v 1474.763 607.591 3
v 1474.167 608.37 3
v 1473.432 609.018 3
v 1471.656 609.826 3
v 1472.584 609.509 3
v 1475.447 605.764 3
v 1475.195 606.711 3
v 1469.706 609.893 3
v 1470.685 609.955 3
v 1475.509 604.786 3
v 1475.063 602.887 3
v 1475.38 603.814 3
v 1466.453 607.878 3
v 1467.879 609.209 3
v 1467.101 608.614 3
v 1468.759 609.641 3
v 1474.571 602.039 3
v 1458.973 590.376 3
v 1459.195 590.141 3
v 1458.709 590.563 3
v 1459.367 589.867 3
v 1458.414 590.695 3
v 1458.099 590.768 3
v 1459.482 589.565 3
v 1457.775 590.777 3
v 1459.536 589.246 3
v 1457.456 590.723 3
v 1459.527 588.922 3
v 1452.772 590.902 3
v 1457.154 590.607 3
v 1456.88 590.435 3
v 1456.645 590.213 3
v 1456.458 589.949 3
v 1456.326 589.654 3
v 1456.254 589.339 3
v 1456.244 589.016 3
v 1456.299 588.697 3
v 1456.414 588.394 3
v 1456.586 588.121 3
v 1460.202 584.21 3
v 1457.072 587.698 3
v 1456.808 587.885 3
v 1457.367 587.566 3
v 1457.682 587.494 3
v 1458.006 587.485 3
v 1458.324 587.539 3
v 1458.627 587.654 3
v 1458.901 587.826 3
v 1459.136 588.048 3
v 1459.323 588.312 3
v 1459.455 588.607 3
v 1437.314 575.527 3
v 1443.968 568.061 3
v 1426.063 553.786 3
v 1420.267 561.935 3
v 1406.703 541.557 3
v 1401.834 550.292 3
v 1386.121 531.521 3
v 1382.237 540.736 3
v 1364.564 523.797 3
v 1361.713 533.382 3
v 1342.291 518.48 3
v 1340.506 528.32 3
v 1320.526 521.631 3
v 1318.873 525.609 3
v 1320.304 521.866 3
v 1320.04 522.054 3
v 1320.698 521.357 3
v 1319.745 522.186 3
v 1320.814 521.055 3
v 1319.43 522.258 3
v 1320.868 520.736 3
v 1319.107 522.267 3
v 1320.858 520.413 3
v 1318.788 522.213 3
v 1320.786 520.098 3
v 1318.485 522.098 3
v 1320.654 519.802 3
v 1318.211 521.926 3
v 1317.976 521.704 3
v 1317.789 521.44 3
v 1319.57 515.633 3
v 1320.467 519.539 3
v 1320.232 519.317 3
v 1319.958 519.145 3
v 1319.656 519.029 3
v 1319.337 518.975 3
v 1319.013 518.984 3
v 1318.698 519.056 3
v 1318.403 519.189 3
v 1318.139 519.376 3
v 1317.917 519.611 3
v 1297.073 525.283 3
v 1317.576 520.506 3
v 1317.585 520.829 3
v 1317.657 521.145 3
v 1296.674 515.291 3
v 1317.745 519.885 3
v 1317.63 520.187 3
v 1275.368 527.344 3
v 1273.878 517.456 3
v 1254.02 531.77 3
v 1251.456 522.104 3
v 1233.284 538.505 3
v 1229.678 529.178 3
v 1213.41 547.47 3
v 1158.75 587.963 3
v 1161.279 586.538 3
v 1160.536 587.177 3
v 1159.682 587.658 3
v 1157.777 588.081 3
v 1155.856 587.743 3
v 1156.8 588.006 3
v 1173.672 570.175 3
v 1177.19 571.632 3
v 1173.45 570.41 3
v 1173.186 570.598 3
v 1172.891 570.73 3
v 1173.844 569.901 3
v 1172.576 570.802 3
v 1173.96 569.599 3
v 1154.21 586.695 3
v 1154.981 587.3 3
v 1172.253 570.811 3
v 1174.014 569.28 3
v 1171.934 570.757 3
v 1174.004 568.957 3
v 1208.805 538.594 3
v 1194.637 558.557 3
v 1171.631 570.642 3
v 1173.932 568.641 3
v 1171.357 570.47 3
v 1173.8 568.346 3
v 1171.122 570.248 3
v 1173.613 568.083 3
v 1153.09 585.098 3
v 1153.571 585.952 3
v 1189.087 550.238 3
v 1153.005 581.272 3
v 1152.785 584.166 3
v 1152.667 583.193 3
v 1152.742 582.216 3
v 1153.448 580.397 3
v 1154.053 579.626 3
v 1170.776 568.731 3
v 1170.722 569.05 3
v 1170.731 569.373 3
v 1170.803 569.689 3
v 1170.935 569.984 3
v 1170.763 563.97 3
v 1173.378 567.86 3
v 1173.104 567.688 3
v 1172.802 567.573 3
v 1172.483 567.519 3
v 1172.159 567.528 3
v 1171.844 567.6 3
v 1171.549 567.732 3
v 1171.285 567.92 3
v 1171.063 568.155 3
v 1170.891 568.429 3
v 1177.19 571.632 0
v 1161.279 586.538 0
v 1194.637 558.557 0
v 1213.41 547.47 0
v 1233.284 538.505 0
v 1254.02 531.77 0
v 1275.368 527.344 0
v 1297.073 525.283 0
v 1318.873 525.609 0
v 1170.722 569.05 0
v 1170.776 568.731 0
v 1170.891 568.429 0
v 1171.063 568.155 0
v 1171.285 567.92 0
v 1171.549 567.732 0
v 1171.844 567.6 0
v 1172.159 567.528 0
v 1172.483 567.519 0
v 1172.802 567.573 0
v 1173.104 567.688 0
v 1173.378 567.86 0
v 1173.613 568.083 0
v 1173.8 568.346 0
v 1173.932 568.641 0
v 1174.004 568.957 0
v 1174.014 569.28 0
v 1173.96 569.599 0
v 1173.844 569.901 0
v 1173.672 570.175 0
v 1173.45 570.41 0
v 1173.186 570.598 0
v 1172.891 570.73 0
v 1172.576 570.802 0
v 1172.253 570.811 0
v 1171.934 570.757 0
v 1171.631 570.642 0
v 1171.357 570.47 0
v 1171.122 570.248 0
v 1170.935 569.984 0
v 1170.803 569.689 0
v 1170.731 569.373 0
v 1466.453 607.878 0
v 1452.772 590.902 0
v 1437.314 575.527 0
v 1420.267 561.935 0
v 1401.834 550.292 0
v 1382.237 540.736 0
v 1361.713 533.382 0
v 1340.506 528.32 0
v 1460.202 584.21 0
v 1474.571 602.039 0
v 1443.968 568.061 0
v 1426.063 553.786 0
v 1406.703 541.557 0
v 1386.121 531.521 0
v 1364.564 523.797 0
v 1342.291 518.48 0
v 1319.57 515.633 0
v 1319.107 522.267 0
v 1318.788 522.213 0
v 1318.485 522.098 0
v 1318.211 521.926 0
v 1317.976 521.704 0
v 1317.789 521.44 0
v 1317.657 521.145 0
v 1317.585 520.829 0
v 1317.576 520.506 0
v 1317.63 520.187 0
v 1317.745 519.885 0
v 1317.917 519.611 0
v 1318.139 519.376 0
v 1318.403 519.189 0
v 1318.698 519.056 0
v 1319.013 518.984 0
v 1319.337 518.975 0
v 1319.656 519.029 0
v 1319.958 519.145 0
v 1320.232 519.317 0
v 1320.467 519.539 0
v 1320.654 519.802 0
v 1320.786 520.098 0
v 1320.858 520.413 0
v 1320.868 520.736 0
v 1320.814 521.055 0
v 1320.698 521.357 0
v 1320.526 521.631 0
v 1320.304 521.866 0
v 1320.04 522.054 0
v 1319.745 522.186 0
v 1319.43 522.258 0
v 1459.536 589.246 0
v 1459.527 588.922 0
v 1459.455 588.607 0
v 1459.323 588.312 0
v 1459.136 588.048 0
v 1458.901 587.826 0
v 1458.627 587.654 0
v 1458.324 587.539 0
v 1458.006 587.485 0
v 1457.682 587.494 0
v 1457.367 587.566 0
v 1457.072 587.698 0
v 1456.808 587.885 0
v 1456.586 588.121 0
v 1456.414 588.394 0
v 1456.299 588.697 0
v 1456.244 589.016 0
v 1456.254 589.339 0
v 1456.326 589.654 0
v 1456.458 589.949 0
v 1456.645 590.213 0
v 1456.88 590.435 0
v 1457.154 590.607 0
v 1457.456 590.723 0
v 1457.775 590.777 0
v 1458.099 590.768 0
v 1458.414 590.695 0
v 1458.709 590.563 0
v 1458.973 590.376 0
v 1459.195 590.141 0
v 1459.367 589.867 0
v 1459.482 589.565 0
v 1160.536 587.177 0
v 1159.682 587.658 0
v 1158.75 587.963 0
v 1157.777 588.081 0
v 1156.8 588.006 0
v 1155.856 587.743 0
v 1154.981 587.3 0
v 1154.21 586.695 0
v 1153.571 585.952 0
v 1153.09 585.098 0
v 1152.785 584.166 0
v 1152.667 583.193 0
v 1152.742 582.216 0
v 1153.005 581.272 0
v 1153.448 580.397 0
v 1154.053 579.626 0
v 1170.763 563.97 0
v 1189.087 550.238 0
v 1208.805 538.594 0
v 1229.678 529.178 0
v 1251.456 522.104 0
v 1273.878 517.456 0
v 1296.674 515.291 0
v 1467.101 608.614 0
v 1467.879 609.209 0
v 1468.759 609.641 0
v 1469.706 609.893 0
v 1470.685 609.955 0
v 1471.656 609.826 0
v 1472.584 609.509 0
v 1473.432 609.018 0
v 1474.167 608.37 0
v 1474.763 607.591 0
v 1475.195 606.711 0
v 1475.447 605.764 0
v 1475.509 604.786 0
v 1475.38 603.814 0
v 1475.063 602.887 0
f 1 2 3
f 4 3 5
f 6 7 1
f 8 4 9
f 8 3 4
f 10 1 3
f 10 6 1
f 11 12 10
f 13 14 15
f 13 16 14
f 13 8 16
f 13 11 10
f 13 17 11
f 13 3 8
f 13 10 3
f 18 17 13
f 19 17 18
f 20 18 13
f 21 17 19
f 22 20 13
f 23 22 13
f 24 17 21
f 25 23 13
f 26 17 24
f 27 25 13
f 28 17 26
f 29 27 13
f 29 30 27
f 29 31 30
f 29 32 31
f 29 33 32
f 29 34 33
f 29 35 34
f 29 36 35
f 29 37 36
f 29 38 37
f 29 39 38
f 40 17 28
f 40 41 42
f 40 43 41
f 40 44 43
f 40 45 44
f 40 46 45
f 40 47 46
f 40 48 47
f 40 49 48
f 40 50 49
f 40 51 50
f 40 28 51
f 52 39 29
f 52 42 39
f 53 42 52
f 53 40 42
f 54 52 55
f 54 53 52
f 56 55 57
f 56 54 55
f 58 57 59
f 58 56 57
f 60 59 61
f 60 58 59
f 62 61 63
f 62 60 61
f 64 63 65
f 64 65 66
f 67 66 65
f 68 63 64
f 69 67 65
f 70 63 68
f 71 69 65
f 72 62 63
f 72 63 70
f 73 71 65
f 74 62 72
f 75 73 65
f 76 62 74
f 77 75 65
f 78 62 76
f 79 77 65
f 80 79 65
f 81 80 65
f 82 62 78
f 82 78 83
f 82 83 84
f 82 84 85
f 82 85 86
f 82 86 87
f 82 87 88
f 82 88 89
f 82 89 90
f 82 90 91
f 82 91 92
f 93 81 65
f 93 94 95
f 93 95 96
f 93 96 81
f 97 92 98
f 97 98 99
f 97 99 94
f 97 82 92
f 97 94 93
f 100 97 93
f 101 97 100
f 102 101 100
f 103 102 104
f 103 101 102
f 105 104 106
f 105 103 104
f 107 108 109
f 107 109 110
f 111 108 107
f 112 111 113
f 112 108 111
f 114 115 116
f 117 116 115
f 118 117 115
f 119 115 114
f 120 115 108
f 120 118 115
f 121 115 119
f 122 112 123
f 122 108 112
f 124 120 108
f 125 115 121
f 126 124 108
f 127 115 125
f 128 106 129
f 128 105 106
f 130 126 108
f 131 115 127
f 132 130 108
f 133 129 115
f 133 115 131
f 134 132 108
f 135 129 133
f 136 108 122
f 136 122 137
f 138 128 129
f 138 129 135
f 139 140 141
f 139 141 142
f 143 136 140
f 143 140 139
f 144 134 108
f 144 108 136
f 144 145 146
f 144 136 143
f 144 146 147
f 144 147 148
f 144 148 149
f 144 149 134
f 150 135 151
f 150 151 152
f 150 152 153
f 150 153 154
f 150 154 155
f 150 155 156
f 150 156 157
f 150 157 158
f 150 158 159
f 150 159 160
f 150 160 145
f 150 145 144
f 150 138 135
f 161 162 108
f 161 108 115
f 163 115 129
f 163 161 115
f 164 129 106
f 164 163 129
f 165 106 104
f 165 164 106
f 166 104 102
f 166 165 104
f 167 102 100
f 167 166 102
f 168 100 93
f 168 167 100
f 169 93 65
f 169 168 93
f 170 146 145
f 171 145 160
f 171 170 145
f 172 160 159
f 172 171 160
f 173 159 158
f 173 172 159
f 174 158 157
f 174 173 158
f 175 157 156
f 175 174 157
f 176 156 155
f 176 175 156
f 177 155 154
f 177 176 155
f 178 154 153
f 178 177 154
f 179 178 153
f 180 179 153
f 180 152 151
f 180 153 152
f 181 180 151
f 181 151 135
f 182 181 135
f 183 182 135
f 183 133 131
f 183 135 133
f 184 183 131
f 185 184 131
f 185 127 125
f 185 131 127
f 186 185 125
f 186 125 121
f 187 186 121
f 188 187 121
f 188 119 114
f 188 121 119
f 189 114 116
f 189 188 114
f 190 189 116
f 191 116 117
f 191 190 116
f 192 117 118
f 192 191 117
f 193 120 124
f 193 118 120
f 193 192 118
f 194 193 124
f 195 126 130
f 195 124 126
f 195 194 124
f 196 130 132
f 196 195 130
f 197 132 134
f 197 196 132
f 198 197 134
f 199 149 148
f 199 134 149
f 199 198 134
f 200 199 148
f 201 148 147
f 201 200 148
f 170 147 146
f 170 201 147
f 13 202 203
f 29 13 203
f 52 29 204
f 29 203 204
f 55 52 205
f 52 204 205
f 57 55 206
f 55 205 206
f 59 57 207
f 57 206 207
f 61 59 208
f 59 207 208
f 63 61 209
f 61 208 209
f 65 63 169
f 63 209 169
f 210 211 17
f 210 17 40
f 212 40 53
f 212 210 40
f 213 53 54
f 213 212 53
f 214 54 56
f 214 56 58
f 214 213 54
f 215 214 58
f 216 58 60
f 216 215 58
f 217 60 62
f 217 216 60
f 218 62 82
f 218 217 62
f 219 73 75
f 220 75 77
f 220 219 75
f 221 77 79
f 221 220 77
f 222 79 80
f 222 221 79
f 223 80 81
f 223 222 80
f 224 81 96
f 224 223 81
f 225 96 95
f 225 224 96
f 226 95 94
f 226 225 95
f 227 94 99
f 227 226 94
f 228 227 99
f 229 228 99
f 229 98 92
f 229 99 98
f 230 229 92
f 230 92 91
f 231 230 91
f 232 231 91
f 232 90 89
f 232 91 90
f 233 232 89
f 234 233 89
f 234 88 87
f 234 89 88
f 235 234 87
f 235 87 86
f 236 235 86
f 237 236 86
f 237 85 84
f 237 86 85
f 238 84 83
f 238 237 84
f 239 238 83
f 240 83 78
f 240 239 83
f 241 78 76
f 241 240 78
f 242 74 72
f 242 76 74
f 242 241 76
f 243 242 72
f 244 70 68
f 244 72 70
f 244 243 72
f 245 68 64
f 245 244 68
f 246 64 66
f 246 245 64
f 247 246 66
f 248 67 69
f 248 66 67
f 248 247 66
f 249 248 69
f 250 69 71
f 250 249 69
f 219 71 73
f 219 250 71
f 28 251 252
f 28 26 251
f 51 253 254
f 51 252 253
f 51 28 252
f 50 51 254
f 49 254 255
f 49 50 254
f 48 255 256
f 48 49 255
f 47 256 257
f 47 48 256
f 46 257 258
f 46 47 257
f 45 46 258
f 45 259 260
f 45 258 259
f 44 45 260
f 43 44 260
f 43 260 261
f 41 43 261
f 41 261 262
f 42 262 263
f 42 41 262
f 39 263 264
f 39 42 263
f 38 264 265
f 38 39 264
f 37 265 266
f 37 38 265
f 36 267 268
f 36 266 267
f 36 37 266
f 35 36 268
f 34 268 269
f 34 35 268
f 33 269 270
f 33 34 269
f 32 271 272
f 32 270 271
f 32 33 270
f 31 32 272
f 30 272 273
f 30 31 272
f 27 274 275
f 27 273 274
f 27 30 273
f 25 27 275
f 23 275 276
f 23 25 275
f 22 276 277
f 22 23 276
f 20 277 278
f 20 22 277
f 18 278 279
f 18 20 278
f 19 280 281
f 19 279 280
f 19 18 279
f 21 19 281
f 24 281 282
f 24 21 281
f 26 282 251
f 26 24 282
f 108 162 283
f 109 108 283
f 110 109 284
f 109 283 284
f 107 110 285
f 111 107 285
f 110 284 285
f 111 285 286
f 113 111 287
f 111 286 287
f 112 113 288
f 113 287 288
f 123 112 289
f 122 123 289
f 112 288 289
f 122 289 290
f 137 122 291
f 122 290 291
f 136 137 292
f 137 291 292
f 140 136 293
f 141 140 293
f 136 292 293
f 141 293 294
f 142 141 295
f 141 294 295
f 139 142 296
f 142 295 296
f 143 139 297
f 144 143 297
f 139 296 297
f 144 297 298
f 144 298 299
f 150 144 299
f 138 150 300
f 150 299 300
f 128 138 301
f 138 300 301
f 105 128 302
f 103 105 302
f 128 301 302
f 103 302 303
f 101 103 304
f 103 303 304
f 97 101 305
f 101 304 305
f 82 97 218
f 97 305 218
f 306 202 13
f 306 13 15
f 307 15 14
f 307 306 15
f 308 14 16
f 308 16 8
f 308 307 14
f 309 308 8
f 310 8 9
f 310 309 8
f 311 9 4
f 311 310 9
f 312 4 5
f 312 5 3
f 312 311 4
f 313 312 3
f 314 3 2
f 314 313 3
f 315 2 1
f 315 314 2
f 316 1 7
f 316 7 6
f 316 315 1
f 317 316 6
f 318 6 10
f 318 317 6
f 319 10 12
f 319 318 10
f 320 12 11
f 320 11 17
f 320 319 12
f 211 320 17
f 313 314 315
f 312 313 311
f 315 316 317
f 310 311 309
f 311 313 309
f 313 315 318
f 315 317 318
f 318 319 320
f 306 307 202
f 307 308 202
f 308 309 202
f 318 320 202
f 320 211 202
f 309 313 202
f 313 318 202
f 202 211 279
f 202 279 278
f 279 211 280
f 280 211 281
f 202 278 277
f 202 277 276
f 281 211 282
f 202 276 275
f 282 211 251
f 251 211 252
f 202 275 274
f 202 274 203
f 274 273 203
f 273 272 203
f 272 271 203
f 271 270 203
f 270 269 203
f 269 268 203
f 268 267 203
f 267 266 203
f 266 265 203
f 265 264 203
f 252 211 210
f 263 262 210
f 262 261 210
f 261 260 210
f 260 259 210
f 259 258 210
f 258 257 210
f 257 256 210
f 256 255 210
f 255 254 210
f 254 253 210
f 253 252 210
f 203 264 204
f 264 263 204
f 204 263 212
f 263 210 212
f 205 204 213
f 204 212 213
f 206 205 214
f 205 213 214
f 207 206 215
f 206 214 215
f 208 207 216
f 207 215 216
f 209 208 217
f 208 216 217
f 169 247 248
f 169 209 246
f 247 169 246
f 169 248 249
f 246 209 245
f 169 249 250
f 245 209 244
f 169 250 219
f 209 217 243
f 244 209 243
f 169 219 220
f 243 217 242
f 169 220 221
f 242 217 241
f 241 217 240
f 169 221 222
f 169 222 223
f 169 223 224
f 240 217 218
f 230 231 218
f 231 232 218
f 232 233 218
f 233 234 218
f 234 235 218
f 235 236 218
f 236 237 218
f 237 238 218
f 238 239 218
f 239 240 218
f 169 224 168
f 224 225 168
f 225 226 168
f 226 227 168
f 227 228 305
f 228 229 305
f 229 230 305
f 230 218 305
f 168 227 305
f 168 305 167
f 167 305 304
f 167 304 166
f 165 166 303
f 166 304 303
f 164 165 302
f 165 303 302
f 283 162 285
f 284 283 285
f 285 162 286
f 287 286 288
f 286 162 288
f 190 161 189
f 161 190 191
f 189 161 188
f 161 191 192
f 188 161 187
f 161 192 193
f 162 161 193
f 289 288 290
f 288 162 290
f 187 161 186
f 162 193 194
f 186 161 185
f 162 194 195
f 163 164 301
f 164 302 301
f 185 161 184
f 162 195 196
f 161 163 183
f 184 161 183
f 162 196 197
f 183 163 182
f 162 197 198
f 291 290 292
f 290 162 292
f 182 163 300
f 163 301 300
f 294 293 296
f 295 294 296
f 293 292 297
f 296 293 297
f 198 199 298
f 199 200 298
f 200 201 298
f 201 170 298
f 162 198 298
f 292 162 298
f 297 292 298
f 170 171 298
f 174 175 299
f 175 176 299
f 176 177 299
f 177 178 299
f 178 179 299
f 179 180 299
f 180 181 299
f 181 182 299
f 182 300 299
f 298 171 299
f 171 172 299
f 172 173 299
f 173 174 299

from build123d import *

# Parameters (mm, degrees)
PAD014_DEPTH                        = 3
SKETCH055_R                         = 1.65
POCKET019_DEPTH                     = 364.282338
POCKET019_DEPTH_BACK                = 367.282338
BODY001003005003003_PLACEMENT_ANGLE = 60
CLONE002_PLACEMENT_ANGLE            = 124


with BuildPart() as part:
    # Sketch052 → Pad014 (new body)
    with BuildSketch(Plane.XY):
        with BuildLine():
            ThreePointArc((152.959511, 127.101705), (84.480895, 180.040089), (0, 198.875477))
            Line((0, 198.875477), (0, 208.875477))
            ThreePointArc((160.650731, 133.492724), (88.728824, 189.092995), (0, 208.875477))
            ThreePointArc((152.959511, 127.101705), (160.000631, 126.451604), (160.650731, 133.492724))
        make_face()
    pad014 = extrude(amount=PAD014_DEPTH)

    # Sketch055 → Pocket019 (cut, two sides)
    with BuildSketch(Plane.XY) as pocket019_sk:
        with Locations((143.11, 145.205847)):
            Circle(SKETCH055_R)
        with BuildLine():
            Line((0, 202.225477), (0, 205.525477))
            ThreePointArc((0, 202.225477), (1.65, 203.875477), (0, 205.525477))
        make_face()
    pocket019 = extrude(amount=-POCKET019_DEPTH, mode=Mode.SUBTRACT) + extrude(pocket019_sk.sketch, amount=POCKET019_DEPTH_BACK, mode=Mode.SUBTRACT)

    # Mirrored019: Pad014, Pocket019 across Sketch052 V_Axis
    add(pad014.mirror(Plane(origin=(0, 0, 0), x_dir=(0, 0, 1), z_dir=(1, 0, 0))))
    add(pocket019.mirror(Plane(origin=(0, 0, 0), x_dir=(0, 0, 1), z_dir=(1, 0, 0))), mode=Mode.SUBTRACT)


with BuildPart() as part_1:
    # Body001003005003003 placement: moved
    add(part.part.rotate(Axis((0, 0, 0), (0, 0, 1)), BODY001003005003003_PLACEMENT_ANGLE))


with BuildPart() as part_2:
    # Clone002 placement: moved
    add(part_1.part.moved(Location((1305, 724, 0))).rotate(Axis((1305, 724, 0), (0, 0, 1)), CLONE002_PLACEMENT_ANGLE))


solid = part_2.part
